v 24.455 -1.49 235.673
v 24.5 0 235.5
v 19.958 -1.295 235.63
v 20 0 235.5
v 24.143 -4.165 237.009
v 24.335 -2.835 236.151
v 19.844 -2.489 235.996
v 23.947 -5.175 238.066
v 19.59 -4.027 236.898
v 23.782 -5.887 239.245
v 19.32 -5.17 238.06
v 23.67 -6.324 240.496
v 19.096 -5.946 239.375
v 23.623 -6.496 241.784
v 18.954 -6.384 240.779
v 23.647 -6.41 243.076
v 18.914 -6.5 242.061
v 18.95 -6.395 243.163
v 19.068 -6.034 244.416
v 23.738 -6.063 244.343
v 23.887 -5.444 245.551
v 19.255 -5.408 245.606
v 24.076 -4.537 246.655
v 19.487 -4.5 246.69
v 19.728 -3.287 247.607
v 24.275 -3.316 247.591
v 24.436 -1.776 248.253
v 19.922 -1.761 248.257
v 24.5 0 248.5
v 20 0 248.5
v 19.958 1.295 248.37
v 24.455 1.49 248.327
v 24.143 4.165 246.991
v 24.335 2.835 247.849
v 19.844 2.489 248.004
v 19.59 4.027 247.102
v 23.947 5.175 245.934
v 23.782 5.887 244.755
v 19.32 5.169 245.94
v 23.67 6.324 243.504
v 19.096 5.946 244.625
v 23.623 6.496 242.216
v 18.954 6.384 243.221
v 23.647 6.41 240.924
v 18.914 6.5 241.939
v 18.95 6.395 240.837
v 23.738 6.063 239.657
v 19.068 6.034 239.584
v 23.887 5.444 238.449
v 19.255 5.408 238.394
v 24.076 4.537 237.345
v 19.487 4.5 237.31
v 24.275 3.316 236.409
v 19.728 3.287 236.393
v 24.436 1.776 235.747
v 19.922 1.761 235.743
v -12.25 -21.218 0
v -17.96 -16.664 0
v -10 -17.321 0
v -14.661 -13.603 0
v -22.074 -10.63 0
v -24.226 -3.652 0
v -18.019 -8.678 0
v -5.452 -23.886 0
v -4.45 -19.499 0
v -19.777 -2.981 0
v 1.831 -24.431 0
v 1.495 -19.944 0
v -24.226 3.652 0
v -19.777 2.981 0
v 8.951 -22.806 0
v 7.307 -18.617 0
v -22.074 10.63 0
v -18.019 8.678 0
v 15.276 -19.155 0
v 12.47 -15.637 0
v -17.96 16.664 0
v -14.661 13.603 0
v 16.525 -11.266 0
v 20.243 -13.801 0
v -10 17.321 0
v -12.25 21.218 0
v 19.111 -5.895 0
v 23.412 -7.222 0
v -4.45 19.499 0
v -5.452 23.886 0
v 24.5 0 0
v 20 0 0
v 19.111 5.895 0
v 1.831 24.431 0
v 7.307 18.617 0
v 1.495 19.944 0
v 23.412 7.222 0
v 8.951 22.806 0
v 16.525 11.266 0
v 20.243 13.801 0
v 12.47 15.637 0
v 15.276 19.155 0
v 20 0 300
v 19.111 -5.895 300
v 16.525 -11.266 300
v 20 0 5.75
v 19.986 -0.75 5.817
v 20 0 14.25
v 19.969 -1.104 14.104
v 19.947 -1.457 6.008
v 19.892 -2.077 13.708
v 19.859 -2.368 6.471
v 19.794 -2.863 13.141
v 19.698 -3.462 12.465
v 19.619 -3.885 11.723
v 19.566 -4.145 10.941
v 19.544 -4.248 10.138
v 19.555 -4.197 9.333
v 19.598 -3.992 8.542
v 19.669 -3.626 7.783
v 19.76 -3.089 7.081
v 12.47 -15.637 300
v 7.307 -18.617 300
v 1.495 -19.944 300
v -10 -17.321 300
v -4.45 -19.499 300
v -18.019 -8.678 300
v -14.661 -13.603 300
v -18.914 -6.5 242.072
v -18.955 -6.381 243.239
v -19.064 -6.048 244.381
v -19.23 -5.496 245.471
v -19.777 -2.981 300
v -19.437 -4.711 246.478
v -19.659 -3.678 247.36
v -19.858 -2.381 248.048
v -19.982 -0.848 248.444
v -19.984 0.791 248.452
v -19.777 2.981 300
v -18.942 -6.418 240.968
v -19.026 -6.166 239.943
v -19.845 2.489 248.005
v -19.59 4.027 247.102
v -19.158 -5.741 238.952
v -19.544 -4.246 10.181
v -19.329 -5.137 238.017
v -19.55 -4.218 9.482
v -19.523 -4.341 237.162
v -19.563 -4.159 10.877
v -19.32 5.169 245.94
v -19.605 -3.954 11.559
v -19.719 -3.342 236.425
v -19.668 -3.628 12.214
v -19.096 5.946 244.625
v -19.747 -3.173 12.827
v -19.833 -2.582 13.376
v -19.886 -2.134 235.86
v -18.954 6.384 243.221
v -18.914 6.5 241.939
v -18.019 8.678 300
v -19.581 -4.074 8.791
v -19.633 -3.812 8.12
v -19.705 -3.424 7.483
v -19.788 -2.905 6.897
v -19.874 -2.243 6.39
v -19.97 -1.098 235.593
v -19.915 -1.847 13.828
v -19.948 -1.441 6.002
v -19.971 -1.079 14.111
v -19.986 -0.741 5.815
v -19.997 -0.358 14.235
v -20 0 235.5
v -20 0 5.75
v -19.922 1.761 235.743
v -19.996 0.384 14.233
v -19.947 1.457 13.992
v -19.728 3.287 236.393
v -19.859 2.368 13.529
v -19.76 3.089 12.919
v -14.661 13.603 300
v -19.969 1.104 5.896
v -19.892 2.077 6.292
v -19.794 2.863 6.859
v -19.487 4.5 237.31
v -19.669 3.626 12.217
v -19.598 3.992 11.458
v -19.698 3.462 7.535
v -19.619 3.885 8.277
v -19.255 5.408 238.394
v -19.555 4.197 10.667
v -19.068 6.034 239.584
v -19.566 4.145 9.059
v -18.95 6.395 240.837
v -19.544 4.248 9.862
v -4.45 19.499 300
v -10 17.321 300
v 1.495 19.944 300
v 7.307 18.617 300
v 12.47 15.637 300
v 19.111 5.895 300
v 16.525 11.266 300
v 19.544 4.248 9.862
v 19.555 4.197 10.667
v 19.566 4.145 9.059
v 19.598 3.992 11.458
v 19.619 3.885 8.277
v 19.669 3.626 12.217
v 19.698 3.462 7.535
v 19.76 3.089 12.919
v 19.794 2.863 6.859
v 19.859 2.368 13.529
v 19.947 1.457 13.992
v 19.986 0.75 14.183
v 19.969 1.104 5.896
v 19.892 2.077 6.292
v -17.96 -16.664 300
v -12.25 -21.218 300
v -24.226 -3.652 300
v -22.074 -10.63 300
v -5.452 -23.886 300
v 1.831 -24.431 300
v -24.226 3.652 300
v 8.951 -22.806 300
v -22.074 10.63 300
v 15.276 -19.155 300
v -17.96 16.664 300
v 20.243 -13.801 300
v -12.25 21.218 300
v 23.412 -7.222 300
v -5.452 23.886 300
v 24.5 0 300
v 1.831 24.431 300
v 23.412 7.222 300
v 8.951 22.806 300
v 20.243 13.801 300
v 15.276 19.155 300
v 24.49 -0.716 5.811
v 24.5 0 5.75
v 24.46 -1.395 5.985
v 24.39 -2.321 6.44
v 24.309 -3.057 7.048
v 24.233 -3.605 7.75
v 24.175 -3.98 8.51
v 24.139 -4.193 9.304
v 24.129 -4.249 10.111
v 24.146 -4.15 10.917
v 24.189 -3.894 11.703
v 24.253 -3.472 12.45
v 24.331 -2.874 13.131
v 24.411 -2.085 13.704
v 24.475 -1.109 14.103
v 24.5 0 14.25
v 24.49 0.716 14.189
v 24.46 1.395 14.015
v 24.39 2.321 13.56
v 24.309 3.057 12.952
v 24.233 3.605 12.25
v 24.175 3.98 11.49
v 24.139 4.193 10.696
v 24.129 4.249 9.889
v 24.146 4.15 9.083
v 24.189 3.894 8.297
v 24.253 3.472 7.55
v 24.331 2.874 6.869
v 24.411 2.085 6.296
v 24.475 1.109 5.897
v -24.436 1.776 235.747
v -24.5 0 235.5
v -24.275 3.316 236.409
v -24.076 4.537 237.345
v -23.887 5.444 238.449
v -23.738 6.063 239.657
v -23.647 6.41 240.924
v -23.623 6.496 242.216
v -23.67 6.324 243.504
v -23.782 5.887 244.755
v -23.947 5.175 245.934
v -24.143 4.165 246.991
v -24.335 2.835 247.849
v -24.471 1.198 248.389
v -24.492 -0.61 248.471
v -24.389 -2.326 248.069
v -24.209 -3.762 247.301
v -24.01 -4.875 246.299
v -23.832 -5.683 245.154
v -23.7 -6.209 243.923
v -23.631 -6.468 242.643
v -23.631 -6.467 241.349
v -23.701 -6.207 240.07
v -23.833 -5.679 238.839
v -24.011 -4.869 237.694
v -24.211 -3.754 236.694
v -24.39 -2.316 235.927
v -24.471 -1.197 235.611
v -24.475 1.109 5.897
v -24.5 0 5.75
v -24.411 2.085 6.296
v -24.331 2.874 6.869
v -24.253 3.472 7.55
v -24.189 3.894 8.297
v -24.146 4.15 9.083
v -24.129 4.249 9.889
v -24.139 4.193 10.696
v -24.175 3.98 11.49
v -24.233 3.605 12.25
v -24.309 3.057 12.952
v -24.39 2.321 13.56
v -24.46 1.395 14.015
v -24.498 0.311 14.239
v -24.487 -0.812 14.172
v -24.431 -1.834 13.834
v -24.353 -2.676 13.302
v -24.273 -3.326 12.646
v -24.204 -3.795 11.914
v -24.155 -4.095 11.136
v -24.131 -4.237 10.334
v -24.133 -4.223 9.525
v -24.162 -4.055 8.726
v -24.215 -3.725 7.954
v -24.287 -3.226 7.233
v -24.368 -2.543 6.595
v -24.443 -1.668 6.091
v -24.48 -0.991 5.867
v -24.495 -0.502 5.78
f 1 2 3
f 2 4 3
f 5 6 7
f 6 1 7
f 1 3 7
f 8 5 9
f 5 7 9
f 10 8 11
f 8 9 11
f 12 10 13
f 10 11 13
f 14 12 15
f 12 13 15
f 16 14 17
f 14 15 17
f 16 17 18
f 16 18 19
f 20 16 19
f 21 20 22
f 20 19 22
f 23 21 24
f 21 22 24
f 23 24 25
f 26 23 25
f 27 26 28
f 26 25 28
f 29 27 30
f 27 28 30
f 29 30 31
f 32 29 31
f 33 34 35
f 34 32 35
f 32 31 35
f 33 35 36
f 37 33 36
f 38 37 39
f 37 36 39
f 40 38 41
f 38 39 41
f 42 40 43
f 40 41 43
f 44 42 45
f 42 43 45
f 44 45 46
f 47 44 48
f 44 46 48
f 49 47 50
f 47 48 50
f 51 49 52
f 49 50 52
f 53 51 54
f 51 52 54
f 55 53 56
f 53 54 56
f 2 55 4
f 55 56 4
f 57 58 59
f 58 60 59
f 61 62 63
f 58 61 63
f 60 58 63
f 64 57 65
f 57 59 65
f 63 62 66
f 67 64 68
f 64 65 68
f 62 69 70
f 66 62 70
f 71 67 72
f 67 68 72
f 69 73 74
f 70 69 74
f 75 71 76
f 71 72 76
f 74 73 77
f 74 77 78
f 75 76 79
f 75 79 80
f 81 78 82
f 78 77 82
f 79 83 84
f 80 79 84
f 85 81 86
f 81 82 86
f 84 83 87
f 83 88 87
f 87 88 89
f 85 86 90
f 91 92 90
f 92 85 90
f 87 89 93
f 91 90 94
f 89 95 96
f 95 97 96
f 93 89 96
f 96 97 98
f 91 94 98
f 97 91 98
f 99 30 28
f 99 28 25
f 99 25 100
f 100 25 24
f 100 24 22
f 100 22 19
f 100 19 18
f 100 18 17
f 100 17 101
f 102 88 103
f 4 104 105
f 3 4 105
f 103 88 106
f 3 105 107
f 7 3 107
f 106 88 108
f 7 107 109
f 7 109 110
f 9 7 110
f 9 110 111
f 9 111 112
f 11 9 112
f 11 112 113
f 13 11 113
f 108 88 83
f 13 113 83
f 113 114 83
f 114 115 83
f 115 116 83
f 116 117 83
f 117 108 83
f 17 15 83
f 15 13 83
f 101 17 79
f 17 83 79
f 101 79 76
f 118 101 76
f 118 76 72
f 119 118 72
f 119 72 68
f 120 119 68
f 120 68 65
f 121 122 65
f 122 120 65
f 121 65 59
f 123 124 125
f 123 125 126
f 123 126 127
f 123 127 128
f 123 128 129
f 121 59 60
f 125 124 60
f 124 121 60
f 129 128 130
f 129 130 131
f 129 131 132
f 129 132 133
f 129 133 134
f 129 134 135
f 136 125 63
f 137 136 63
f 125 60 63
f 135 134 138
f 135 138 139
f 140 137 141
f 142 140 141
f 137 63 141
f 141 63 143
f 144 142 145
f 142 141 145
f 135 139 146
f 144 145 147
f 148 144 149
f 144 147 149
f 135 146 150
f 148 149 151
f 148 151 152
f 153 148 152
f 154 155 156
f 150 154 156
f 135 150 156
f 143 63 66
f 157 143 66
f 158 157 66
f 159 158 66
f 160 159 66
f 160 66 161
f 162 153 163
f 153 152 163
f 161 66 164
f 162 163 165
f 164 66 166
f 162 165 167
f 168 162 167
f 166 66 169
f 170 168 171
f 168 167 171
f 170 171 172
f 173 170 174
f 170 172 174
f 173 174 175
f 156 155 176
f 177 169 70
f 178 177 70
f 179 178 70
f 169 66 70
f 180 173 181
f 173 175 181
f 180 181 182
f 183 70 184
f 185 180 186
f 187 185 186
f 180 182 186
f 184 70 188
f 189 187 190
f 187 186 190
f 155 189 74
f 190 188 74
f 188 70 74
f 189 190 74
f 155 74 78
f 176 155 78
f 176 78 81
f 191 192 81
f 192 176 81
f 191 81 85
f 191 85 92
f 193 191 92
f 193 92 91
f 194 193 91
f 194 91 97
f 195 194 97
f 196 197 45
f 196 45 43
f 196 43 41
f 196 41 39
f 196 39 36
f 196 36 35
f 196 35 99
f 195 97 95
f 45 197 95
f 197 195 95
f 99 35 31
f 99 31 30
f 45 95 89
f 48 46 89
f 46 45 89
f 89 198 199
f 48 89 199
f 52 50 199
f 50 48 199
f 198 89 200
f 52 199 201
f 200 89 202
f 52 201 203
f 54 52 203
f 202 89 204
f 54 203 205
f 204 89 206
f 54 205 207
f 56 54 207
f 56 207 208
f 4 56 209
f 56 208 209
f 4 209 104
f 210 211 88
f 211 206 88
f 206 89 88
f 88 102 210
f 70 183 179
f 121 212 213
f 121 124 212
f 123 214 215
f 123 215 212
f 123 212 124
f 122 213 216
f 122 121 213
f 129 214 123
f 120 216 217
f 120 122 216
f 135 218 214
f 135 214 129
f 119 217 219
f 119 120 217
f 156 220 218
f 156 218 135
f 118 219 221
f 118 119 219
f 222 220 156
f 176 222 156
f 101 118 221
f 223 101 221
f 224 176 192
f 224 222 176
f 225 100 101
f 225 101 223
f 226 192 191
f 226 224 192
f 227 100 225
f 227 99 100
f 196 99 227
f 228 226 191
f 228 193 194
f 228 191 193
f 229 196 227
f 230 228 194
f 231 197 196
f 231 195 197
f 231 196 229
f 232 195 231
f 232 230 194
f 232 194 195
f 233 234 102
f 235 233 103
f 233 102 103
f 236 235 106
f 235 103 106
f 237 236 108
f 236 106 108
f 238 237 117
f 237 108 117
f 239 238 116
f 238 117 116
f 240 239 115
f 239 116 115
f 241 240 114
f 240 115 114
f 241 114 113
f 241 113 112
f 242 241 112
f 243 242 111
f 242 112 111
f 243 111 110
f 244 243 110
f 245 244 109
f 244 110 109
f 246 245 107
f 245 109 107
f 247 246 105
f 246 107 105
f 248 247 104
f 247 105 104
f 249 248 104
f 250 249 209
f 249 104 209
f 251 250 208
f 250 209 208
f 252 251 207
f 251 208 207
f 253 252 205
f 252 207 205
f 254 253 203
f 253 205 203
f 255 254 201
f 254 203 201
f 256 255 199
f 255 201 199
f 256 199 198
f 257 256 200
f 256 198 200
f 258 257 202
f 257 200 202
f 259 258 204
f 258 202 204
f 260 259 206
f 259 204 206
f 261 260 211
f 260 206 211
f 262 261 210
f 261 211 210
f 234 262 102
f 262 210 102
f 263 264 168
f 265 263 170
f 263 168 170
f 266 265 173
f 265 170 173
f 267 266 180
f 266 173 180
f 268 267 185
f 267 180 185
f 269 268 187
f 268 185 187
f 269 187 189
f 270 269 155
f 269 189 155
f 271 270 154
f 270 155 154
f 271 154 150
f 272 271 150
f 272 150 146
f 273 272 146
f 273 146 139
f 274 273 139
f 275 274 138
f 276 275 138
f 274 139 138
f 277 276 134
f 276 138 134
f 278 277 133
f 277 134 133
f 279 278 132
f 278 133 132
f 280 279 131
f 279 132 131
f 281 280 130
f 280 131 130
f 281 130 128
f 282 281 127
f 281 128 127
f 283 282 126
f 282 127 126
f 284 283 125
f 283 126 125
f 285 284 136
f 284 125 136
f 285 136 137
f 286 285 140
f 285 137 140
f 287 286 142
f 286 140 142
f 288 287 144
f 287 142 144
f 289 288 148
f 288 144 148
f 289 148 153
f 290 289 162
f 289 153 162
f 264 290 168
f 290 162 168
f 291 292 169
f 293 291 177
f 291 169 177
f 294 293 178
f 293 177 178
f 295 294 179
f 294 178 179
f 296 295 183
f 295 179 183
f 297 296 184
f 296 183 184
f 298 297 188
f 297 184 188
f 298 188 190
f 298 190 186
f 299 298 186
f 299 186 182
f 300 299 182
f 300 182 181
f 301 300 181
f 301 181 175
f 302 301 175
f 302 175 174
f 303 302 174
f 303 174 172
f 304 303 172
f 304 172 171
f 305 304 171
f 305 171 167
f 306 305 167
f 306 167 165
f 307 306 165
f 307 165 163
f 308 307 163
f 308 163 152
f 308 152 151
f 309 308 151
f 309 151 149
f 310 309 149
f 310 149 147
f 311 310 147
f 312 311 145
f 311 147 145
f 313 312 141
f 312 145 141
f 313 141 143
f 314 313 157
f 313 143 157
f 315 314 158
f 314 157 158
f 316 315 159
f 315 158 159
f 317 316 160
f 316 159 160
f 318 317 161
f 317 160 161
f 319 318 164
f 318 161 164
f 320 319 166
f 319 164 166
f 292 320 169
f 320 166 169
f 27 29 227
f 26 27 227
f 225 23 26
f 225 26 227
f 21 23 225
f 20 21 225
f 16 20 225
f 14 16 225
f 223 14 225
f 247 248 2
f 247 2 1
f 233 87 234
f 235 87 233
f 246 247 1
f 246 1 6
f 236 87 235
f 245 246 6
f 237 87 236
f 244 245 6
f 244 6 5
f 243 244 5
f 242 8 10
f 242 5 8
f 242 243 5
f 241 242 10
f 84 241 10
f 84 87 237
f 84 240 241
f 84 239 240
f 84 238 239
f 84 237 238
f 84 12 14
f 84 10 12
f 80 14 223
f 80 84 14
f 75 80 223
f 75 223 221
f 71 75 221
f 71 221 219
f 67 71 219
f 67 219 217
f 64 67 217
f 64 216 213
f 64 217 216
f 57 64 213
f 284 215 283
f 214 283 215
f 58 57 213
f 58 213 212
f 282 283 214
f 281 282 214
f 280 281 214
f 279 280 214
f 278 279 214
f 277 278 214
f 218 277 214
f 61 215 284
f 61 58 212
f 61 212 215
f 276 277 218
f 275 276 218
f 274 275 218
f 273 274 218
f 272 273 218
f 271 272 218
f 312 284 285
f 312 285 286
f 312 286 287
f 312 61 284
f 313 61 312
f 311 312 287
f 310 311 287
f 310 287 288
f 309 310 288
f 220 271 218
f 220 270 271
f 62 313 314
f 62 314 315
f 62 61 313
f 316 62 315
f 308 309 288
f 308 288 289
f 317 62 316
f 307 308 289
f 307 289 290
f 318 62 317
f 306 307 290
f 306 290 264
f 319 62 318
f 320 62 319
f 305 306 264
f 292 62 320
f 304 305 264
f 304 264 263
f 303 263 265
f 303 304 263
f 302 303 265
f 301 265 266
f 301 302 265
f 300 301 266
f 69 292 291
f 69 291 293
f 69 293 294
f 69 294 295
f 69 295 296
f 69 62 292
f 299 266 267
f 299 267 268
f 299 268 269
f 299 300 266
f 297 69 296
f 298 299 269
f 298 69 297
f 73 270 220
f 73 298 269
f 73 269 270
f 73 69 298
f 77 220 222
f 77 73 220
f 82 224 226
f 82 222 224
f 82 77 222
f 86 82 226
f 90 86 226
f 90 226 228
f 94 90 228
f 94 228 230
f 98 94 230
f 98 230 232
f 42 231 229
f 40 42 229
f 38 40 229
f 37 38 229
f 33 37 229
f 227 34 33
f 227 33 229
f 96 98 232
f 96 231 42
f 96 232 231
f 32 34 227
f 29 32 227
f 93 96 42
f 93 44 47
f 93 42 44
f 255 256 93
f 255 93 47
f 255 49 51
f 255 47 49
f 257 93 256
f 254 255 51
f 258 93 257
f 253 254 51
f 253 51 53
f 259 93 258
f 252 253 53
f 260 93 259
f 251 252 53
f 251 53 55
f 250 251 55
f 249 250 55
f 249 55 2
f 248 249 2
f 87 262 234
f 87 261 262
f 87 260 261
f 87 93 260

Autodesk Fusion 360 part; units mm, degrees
sketch "Sketch1" plane through (0, 0, 0) normal (0, 0, 1) x (1, 0, 0)
  circle A0 centre (0, 0) radius 24.5
  circle A1 centre (0, 0) radius 20
  dimension "d1" = 49
  dimension "d2" = 4.5
extrude "Extrude1" add sketch "Sketch1" along normal blind 300
ref_plane "WorkPlane1" through (0, 0, 10) normal (0, 0, 1) x (1, 0, 0)
ref_plane "WorkPlane2" through (0, 0, 300) normal (0, 0, 1) x (1, 0, 0)
ref_plane "WorkPlane3" through (0, 0, 242) normal (0, 0, 1) x (1, 0, 0)
sketch "Sketch2" plane through (0, 0, 0) normal (1, 0, 0) x (0, 0, -1)
  line L0 (-10, 42.4058) -> (-10, 1.4623) construction
  line L1 (-300, 66.3479) -> (-300, -66.3479) construction
  line L2 (-242, 79.6175) -> (-242, -79.6175) construction
  line L3 (-300, 0) -> (0, 0) construction
  line L4 (-10, 1.4623) -> (-10, 0) construction
  circle A0 centre (-10, 0) radius 4.25
  circle A1 centre (-242, 0) radius 6.5
  dimension "d8" = 8.5
  dimension "d9" = 13
extrude "Extrude2" cut sketch "Sketch2" along normal through all and the other way through all
